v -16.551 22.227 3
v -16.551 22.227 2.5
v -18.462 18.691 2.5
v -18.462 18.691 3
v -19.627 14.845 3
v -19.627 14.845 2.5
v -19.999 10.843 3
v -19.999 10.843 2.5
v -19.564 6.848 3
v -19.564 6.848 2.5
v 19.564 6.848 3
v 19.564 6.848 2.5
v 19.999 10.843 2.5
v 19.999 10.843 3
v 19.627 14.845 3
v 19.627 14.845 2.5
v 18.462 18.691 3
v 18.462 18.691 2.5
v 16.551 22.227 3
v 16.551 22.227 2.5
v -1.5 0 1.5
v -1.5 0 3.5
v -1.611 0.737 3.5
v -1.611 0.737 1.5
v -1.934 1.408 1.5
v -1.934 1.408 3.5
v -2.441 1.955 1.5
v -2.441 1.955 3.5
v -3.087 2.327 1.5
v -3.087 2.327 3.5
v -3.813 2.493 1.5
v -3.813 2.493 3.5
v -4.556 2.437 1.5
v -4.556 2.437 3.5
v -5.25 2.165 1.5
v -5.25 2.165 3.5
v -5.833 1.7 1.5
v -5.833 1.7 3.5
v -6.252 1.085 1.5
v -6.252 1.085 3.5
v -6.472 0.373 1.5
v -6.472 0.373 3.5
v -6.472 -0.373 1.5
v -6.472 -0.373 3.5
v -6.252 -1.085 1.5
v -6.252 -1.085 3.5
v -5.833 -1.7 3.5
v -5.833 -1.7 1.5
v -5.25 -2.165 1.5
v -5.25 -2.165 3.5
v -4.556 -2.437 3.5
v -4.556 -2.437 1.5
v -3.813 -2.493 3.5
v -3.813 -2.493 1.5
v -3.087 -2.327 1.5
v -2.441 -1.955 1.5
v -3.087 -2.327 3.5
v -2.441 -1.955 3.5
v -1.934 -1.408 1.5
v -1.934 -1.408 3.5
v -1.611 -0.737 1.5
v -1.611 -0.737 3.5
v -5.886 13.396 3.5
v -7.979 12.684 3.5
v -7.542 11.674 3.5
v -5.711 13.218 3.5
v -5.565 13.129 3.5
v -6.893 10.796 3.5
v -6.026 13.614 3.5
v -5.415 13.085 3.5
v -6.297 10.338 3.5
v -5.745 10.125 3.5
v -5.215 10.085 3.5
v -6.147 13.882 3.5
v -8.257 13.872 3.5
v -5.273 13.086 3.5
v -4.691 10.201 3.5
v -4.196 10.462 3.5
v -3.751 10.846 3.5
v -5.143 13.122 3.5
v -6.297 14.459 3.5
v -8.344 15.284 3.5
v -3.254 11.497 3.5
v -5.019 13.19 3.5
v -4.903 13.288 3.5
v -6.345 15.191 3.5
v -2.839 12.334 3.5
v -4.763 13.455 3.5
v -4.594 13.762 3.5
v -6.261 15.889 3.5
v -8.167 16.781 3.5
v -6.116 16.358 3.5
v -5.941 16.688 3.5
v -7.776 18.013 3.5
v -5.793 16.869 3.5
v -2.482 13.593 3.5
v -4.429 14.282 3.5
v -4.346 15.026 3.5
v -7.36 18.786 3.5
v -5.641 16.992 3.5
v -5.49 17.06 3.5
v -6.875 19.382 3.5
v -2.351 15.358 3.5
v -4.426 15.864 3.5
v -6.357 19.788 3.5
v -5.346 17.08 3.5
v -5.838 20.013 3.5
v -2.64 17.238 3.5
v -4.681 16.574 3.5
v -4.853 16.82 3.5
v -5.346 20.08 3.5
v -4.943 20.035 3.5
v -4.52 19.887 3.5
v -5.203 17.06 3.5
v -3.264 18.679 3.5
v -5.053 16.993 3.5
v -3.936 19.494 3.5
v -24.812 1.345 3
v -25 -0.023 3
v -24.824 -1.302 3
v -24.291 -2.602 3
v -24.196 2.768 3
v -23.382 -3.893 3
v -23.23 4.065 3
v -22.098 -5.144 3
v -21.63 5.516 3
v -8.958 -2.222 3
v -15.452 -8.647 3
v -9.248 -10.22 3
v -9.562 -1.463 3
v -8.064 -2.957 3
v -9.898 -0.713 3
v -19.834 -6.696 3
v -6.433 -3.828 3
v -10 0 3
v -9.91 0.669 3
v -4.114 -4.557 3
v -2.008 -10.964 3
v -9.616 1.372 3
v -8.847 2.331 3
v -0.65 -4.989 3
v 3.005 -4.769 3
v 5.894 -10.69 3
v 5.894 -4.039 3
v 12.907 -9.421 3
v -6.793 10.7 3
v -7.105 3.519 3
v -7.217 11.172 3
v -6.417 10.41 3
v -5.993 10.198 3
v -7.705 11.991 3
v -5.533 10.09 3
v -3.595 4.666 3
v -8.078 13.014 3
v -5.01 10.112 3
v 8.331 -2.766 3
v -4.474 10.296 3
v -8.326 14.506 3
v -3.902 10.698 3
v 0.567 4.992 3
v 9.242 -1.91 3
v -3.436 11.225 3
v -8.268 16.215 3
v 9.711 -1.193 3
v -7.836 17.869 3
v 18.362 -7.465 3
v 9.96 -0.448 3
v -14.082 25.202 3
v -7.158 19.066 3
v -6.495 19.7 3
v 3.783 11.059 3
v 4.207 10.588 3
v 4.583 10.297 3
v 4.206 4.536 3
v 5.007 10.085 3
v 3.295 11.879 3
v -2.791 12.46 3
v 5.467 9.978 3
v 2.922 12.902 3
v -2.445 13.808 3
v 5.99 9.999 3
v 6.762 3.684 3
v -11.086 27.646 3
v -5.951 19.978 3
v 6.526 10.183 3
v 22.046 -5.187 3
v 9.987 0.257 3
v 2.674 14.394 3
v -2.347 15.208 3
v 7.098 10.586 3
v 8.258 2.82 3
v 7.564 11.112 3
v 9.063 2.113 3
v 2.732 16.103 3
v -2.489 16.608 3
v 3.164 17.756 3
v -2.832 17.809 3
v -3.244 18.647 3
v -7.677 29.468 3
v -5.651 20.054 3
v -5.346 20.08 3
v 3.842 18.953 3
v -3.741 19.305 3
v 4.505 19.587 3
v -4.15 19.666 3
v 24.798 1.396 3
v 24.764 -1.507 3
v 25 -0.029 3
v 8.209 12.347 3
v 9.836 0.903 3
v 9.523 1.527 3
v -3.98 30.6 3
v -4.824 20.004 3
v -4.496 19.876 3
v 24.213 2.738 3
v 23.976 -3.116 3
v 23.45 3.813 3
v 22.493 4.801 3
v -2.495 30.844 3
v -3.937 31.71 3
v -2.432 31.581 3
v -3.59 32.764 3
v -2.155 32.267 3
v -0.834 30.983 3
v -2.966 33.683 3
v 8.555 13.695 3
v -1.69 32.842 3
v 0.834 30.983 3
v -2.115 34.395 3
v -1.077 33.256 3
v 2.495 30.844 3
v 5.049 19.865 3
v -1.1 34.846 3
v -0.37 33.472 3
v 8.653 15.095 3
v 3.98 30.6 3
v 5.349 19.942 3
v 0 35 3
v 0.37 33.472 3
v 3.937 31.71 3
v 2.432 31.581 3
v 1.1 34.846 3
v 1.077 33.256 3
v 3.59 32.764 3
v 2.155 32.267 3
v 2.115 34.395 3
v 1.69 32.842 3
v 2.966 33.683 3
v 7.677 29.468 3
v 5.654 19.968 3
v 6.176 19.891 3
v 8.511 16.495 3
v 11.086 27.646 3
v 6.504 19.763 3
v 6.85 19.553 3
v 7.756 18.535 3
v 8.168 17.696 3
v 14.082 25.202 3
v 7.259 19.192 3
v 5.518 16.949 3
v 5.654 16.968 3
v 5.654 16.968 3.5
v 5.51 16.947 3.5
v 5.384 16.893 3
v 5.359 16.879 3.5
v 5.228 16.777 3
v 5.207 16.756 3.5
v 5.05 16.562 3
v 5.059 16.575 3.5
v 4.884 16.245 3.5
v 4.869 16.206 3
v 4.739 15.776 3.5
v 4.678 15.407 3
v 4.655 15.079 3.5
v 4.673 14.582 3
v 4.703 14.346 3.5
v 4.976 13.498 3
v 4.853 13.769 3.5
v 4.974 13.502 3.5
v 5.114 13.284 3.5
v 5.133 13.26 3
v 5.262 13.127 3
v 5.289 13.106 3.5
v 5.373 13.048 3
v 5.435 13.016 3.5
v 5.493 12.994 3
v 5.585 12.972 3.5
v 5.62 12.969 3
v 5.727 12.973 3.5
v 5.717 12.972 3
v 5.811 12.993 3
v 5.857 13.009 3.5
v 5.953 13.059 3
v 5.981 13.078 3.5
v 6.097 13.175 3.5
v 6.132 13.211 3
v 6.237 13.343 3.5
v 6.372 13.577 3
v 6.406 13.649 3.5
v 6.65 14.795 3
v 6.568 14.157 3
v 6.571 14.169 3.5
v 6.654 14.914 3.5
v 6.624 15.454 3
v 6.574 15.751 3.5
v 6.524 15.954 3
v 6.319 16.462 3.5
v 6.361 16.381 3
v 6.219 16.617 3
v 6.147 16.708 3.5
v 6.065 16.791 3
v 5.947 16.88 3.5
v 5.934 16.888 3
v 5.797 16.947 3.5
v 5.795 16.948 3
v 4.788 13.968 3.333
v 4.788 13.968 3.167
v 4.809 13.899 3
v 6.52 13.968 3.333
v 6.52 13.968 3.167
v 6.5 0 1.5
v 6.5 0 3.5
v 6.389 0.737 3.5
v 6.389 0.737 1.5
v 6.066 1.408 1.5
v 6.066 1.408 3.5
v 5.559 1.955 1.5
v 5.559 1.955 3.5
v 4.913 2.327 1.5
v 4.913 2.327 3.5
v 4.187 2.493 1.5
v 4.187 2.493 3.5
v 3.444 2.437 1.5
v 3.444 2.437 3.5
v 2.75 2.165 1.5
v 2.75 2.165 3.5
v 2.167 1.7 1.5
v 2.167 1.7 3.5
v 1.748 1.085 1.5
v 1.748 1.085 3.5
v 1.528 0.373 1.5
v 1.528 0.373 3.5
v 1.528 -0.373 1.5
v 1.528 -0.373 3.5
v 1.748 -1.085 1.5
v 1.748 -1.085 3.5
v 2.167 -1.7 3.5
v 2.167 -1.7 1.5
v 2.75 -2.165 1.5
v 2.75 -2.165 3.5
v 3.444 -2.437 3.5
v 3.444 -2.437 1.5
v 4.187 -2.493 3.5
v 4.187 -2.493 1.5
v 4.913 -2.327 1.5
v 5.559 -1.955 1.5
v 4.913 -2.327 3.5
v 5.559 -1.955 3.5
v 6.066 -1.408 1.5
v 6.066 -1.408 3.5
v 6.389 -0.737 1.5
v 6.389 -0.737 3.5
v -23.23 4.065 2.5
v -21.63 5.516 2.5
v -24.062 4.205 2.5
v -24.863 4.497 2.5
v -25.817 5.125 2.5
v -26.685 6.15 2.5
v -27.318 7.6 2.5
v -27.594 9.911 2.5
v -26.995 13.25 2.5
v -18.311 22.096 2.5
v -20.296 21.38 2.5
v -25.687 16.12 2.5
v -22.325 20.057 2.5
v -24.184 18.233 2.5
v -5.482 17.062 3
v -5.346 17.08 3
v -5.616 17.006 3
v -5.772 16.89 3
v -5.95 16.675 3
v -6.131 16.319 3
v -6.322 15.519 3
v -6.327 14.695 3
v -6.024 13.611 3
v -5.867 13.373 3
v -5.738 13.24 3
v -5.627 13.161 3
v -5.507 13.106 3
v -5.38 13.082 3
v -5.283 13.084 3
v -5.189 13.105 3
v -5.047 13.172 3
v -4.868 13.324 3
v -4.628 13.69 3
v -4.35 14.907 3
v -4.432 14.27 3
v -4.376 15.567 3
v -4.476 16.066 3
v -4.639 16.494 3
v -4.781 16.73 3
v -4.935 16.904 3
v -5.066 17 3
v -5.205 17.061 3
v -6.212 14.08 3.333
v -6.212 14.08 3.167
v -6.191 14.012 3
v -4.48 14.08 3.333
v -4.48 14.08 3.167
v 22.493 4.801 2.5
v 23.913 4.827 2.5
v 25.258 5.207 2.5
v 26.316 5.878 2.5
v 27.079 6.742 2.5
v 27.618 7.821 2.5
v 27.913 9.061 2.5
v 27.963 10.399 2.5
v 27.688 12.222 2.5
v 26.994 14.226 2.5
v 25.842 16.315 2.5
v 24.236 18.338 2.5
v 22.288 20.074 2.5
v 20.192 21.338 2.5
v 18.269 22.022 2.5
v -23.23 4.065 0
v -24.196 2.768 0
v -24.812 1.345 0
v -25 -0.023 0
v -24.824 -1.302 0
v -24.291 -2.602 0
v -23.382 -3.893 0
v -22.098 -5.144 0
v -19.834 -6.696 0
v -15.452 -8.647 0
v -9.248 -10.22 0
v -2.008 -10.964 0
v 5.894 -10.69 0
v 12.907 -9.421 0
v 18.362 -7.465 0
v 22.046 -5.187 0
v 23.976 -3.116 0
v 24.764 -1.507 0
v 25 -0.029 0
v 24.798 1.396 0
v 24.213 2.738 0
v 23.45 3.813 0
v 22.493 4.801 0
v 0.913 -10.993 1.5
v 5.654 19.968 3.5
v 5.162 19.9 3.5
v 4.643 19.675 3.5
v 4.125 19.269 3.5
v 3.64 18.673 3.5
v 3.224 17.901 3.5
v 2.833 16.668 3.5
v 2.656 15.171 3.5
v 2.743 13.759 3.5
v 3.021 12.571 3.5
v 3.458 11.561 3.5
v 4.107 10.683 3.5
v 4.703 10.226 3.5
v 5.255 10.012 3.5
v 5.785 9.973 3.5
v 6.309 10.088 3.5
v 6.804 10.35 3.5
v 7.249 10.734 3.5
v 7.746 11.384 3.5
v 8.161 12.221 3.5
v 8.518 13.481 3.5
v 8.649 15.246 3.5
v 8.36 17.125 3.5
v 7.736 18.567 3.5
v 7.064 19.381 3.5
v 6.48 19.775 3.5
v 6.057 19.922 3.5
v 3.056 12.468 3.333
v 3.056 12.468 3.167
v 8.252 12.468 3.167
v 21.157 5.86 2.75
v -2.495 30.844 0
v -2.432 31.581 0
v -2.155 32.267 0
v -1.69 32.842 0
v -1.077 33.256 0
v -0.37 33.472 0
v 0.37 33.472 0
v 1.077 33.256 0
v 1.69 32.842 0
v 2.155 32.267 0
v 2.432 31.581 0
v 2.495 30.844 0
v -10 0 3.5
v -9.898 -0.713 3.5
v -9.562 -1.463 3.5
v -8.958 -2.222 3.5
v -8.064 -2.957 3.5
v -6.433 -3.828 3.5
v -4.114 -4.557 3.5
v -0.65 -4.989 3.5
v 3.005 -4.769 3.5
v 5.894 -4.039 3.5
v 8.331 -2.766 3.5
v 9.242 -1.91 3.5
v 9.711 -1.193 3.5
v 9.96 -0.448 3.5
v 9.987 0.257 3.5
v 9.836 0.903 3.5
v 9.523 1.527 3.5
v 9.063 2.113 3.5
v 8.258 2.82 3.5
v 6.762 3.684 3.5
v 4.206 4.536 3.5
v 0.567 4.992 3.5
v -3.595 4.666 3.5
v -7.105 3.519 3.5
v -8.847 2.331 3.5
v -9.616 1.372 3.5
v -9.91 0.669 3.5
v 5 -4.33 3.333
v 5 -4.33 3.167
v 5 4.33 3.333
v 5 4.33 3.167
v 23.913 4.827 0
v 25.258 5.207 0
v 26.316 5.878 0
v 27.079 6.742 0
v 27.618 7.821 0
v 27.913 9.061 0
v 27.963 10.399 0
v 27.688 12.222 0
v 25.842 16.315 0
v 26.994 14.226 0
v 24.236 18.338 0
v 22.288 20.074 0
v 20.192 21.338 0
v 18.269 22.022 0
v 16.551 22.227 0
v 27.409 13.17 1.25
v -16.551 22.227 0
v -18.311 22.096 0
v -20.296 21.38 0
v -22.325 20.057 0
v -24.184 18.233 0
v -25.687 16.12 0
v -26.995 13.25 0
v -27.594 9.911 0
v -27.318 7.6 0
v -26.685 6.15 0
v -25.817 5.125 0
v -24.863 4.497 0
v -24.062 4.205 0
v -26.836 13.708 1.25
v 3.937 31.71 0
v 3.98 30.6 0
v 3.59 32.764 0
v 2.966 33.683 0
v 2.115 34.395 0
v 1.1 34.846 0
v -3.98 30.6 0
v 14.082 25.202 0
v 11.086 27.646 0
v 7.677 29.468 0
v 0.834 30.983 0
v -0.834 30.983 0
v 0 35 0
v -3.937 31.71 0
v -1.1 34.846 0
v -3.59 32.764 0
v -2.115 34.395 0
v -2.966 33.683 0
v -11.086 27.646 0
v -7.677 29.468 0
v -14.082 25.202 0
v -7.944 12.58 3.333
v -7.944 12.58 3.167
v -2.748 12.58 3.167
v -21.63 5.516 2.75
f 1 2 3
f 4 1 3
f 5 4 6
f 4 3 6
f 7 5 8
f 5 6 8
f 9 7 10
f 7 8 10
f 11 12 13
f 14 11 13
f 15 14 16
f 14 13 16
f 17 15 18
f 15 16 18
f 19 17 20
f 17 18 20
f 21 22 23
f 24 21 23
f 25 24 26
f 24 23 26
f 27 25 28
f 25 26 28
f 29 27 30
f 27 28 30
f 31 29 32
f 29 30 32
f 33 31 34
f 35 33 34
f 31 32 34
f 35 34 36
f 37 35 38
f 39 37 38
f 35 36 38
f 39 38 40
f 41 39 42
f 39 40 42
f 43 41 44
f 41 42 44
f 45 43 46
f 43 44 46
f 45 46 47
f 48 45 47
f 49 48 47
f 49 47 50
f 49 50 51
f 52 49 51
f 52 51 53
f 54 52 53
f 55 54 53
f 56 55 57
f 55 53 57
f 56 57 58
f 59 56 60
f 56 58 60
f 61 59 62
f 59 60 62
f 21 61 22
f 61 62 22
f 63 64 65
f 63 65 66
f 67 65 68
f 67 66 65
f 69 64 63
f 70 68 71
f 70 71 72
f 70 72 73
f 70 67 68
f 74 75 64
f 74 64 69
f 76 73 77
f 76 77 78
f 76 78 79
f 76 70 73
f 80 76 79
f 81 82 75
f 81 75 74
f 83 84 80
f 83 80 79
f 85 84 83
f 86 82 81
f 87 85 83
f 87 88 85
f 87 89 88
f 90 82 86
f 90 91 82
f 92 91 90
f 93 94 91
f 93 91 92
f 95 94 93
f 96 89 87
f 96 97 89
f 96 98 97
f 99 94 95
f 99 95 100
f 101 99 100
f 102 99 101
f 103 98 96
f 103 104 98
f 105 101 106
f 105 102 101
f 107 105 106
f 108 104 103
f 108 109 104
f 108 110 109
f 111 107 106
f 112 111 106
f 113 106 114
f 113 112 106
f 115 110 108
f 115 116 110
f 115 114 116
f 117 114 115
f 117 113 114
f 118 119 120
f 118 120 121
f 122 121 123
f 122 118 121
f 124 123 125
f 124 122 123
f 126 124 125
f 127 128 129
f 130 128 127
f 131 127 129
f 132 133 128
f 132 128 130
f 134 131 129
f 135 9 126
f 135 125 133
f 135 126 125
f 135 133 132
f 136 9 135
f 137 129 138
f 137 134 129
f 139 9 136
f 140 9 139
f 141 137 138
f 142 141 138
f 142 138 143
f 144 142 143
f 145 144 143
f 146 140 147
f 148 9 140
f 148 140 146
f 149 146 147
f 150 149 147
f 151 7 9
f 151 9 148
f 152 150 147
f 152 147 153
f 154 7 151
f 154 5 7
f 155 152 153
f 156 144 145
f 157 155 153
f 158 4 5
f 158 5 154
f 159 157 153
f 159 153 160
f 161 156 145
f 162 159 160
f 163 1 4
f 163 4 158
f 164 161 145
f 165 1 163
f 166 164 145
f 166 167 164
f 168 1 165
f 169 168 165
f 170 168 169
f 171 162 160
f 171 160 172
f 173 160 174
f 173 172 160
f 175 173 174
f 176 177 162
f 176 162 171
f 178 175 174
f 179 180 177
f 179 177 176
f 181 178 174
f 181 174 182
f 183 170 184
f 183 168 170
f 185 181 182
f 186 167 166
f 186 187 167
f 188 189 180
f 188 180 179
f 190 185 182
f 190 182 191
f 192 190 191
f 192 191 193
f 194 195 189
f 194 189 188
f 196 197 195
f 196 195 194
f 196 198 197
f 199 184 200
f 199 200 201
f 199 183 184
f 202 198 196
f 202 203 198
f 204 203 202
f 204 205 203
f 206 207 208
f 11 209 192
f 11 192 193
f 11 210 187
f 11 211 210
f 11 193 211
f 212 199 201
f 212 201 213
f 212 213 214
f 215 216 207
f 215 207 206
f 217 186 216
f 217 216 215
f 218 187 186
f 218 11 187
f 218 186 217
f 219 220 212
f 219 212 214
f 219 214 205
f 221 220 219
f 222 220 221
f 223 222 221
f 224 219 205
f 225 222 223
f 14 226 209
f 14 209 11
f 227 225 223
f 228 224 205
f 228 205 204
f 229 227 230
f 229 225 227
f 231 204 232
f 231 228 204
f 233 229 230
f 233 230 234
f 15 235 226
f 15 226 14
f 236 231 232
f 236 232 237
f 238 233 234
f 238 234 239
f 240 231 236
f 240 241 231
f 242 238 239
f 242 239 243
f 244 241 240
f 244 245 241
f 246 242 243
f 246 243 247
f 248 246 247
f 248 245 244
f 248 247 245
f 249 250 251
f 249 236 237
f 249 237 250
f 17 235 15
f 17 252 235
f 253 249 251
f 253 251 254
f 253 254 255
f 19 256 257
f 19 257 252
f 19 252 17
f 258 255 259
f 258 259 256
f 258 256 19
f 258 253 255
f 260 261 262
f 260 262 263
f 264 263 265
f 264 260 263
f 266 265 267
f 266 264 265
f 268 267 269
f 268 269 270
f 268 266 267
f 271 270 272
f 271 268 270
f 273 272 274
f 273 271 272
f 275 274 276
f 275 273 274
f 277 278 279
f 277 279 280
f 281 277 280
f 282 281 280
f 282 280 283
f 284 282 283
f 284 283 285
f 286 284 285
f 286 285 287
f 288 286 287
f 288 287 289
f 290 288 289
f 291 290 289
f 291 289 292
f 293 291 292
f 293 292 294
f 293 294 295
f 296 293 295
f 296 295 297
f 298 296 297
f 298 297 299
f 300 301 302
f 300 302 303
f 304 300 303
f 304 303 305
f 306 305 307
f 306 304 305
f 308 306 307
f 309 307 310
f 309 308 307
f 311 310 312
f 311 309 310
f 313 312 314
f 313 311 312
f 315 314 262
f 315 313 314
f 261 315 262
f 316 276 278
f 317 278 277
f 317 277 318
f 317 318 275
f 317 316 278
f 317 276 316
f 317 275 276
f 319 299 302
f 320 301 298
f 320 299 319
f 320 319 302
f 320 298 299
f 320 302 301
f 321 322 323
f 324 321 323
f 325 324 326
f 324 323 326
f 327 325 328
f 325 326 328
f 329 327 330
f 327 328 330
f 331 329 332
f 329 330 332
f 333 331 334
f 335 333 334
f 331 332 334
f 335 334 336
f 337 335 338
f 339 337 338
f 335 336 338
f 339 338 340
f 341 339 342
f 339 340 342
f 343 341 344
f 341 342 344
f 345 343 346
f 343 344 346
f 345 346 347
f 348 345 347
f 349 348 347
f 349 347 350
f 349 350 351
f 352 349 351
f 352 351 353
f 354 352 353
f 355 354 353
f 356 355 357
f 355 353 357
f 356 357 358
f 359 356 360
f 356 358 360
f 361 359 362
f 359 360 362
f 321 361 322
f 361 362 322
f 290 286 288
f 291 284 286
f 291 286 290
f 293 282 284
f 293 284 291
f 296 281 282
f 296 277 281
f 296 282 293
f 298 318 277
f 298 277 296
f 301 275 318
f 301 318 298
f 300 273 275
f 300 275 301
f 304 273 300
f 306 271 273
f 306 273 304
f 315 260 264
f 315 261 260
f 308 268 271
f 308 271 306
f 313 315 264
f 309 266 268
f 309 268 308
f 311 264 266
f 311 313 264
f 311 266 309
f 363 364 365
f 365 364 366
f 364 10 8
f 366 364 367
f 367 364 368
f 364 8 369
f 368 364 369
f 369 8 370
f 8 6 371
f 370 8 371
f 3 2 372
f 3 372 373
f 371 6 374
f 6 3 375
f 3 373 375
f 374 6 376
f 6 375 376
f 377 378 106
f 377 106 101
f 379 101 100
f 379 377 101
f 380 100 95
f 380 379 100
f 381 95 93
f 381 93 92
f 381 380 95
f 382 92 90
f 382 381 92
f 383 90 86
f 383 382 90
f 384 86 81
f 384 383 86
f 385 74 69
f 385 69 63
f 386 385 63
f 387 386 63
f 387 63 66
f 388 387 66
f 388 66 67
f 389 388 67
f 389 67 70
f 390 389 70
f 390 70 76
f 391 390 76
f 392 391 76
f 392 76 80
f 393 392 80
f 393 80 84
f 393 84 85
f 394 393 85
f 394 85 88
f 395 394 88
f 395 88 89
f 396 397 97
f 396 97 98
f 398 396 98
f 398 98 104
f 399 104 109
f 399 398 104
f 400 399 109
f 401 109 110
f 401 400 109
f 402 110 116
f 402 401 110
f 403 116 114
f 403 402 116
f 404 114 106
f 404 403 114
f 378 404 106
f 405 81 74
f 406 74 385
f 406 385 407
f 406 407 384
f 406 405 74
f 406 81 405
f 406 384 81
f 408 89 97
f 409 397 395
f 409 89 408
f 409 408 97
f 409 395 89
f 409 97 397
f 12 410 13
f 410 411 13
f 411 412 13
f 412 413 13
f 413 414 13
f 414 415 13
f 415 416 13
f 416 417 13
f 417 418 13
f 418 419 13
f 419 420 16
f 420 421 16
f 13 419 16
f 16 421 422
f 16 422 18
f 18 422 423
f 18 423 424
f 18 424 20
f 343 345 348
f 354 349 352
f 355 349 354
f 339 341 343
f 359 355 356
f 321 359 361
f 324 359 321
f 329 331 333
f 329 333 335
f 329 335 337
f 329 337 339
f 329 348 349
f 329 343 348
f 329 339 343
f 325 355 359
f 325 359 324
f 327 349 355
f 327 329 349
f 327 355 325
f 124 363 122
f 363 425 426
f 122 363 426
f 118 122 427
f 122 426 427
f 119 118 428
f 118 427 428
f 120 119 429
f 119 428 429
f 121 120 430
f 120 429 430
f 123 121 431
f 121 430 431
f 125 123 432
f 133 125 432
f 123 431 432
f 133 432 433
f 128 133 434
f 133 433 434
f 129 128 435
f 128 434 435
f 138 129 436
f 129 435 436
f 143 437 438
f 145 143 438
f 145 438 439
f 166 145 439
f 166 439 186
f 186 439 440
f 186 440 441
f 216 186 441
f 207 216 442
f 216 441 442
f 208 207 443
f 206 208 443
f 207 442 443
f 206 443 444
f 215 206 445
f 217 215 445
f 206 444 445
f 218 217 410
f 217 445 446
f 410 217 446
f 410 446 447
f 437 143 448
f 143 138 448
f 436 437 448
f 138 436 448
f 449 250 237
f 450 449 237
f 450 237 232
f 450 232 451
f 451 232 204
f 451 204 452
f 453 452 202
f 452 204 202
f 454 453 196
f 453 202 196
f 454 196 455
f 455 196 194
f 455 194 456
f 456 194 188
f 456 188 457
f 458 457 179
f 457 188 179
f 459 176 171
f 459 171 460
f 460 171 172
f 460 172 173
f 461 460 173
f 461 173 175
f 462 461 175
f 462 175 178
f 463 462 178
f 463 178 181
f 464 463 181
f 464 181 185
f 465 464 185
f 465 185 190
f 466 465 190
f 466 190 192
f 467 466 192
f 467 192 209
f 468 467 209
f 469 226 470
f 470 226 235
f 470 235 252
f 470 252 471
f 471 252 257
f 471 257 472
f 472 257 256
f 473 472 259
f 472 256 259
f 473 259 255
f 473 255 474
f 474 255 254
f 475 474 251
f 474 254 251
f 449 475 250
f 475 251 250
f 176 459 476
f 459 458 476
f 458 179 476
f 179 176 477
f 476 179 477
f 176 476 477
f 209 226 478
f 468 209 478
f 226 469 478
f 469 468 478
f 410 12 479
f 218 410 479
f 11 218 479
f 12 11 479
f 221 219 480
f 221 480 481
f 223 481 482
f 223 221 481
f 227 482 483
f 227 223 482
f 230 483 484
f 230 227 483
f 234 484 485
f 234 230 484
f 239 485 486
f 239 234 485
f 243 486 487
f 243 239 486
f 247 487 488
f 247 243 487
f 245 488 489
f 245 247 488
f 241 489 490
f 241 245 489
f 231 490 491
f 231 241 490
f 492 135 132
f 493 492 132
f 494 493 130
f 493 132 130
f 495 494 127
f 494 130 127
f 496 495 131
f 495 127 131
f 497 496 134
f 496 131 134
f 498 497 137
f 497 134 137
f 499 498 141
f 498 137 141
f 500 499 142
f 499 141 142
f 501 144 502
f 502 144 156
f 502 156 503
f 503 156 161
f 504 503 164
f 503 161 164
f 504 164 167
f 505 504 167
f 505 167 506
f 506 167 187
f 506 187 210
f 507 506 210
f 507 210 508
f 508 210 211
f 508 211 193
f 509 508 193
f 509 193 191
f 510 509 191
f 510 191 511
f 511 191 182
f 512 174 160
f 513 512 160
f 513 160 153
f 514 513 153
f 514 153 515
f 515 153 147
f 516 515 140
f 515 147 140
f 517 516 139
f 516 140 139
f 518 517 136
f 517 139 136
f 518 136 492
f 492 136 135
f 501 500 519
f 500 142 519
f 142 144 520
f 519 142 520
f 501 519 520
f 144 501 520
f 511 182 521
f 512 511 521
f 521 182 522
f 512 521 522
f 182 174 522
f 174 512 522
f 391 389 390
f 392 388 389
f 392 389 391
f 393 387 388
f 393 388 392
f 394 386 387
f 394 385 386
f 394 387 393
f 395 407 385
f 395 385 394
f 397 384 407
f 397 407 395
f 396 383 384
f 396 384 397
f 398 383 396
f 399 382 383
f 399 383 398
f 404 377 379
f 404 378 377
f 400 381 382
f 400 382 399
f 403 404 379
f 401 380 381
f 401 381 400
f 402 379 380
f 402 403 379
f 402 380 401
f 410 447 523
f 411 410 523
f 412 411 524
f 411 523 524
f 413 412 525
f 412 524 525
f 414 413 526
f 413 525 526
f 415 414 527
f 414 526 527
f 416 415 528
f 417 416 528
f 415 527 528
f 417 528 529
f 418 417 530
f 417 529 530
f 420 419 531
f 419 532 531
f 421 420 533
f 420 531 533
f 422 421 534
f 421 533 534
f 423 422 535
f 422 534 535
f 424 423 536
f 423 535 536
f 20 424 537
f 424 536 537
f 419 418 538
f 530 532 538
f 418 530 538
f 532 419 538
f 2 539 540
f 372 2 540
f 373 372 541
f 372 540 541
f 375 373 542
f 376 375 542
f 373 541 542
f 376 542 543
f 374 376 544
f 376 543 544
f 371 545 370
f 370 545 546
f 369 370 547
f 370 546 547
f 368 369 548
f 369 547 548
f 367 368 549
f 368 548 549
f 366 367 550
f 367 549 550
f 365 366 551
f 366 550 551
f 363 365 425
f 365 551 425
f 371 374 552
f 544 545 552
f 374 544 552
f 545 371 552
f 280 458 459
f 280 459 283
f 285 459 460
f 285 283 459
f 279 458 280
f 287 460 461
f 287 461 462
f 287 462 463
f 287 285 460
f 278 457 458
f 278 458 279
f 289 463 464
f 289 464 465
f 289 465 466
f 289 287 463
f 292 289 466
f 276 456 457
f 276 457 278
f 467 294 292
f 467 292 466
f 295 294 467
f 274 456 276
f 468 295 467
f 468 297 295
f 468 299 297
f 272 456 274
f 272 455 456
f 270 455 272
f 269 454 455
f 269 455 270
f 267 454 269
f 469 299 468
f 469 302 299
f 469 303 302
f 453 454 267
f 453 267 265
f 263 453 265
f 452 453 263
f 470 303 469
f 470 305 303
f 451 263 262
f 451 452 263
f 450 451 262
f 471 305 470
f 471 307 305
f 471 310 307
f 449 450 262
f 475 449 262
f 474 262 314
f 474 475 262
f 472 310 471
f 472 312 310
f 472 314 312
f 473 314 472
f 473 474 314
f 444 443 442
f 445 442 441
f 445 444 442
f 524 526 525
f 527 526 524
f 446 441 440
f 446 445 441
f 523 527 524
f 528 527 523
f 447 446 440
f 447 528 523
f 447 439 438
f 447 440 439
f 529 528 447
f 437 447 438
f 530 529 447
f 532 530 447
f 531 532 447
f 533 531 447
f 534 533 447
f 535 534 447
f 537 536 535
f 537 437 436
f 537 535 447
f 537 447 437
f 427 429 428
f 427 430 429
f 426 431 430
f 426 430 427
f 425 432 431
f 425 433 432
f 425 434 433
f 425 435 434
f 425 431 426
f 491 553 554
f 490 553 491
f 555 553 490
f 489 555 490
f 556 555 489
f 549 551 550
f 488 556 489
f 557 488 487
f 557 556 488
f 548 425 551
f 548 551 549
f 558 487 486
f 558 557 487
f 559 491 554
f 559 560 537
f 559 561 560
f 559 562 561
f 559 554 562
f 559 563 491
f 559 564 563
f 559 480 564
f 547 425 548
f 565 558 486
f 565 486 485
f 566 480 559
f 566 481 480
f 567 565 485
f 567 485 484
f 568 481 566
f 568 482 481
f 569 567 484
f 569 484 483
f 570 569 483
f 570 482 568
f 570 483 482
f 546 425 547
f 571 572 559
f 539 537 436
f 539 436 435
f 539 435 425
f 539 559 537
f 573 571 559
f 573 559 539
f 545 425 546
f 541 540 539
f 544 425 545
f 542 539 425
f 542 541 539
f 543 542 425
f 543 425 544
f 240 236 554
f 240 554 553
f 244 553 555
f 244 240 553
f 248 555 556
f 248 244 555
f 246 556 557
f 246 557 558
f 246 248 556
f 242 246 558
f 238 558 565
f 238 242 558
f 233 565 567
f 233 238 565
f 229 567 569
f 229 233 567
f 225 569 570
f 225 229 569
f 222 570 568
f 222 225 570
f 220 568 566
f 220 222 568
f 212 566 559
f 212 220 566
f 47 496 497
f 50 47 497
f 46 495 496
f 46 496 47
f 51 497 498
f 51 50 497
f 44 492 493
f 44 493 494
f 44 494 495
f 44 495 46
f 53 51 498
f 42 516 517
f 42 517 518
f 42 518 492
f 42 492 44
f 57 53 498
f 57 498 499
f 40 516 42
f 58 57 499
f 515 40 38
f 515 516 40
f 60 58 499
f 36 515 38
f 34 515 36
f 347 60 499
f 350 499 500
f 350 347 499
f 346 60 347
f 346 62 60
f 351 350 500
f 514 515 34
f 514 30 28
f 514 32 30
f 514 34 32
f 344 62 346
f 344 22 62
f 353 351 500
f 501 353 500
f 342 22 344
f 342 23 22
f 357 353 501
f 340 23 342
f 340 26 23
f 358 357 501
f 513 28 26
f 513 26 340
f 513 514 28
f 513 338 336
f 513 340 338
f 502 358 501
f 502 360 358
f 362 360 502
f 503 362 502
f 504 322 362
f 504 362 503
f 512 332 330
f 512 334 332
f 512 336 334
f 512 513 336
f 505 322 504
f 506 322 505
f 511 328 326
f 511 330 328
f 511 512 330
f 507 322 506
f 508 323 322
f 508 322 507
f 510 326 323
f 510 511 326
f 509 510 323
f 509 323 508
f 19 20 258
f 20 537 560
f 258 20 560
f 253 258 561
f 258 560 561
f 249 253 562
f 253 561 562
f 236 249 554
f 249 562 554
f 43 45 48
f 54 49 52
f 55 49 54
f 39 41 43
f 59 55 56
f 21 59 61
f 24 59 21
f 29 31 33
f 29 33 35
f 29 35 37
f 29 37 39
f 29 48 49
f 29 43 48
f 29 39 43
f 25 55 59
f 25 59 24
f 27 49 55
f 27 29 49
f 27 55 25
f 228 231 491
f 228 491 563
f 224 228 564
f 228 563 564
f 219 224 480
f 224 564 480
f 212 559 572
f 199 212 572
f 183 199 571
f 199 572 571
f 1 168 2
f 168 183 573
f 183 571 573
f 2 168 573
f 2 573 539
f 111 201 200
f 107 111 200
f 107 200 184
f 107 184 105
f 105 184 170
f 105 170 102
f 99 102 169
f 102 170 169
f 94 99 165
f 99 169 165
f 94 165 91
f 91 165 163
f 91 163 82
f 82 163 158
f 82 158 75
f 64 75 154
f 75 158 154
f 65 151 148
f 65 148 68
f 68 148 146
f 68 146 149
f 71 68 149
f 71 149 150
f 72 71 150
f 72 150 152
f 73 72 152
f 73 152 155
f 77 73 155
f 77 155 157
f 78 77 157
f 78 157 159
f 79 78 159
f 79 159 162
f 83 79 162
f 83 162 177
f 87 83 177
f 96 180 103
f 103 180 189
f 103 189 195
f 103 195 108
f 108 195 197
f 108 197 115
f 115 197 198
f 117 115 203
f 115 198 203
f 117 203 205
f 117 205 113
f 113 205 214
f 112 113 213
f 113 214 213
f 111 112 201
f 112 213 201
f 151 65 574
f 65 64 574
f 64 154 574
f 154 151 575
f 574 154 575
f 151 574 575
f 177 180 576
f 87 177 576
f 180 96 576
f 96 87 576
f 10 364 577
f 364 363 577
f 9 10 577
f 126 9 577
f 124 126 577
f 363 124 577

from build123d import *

# Parameters (mm, degrees)
F2_DEPTH  = 3
F3_DEPTH  = 3.5
F4_DEPTH  = 2.5
F6_DEPTH  = 3.5
F7_DEPTH  = 1
F8_R      = 2.5
F9_DEPTH  = 2
F11_DEPTH = 3


with BuildPart() as f2:
    # F0 (on Top) → F2 (new body)
    with BuildSketch(Plane.XY):
        with BuildLine():
            ThreePointArc((-16.5514327476, 22.2272024121), (-19.6269067874, 14.845065664), (-19.5643091096, 6.8481559441))
            add(Edge.make_bspline(
                [(-19.5643091096, 6.8481559441), (-21.8645069568, 5.5759382833), (-23.23, 4.0653499923)],
                knots=[5.6111760506, 5.6111760506, 5.6111760506, 5.9046312652, 5.9046312652, 5.9046312652], degree=2, weights=[1, 0.9892548032, 1]))
            add(Edge.make_bspline(
                [(-23.23, 4.0653499923), (-37.3986969508, -11.6088914976), (0.9132892277, -10.992657494), (39.2252754062, -10.3764234903), (22.4933852711, 4.8007935852)],
                knots=[5.9046312652, 5.9046312652, 5.9046312652, 7.8905213335, 7.8905213335, 9.8764114018, 9.8764114018, 9.8764114018], degree=2, weights=[1, 0.5462253596, 1, 0.5462253596, 1]))
            add(Edge.make_bspline(
                [(22.4933852711, 4.8007935852), (21.2862472359, 5.8957682624), (19.5643091096, 6.8481559441)],
                knots=[3.5932260947, 3.5932260947, 3.5932260947, 3.8136019101, 3.8136019101, 3.8136019101], degree=2, weights=[1, 0.9939354522, 1]))
            ThreePointArc((19.5643091096, 6.8481559441), (19.6269067874, 14.845065664), (16.5514327476, 22.2272024121))
            ThreePointArc((16.5514327476, 22.2272024121), (0, 31), (-16.5514327476, 22.2272024121))
        make_face()
        with BuildLine():
            add(Edge.make_bspline(
                [(-10, 0), (-10, -8.6602540378), (5, -4.3301270189), (20, 0), (5, 4.3301270189), (-10, 8.6602540378), (-10, 0)],
                knots=[0, 0, 0, 2.0943951024, 2.0943951024, 4.1887902048, 4.1887902048, 6.2831853072, 6.2831853072, 6.2831853072], degree=2, weights=[1, 0.5, 1, 0.5, 1, 0.5, 1]))
        make_face(mode=Mode.SUBTRACT)
    extrude(amount=F2_DEPTH)

    # F1 (on Top) → F3 (join)
    with BuildSketch(Plane.XY):
        with BuildLine():
            add(Edge.make_bspline(
                [(5.653910271, 19.9677419355), (0.4577578483, 19.9677419355), (3.0558340597, 12.4677419355), (5.653910271, 4.9677419355), (8.2519864824, 12.4677419355), (10.8500626937, 19.9677419355), (5.653910271, 19.9677419355)],
                knots=[0, 0, 0, 2.0943951024, 2.0943951024, 4.1887902048, 4.1887902048, 6.2831853072, 6.2831853072, 6.2831853072], degree=2, weights=[1, 0.5, 1, 0.5, 1, 0.5, 1]))
        make_face()
        with BuildLine():
            add(Edge.make_bspline(
                [(5.653910271, 16.9677419355), (3.9218594635, 16.9677419355), (4.7878848672, 13.9677419355), (5.653910271, 10.9677419355), (6.5199356748, 13.9677419355), (7.3859610786, 16.9677419355), (5.653910271, 16.9677419355)],
                knots=[0, 0, 0, 2.0943951024, 2.0943951024, 4.1887902048, 4.1887902048, 6.2831853072, 6.2831853072, 6.2831853072], degree=2, weights=[1, 0.5, 1, 0.5, 1, 0.5, 1]))
        make_face(mode=Mode.SUBTRACT)
        with BuildLine():
            add(Edge.make_bspline(
                [(-5.346089729, 20.0804285287), (-10.5422421517, 20.0804285287), (-7.9441659403, 12.5804285287), (-5.346089729, 5.0804285287), (-2.7480135176, 12.5804285287), (-0.1499373063, 20.0804285287), (-5.346089729, 20.0804285287)],
                knots=[0, 0, 0, 2.0943951024, 2.0943951024, 4.1887902048, 4.1887902048, 6.2831853072, 6.2831853072, 6.2831853072], degree=2, weights=[1, 0.5, 1, 0.5, 1, 0.5, 1]))
        make_face()
        with BuildLine():
            add(Edge.make_bspline(
                [(-5.346089729, 17.0804285287), (-7.0781405365, 17.0804285287), (-6.2121151328, 14.0804285287), (-5.346089729, 11.0804285287), (-4.4800643252, 14.0804285287), (-3.6140389214, 17.0804285287), (-5.346089729, 17.0804285287)],
                knots=[0, 0, 0, 2.0943951024, 2.0943951024, 4.1887902048, 4.1887902048, 6.2831853072, 6.2831853072, 6.2831853072], degree=2, weights=[1, 0.5, 1, 0.5, 1, 0.5, 1]))
        make_face(mode=Mode.SUBTRACT)
    extrude(amount=F3_DEPTH)

    # F0 (on Top) → F4 (join)
    with BuildSketch(Plane.XY):
        with BuildLine():
            add(Edge.make_bspline(
                [(22.4933852711, 4.8007935852), (21.2862472359, 5.8957682624), (19.5643091096, 6.8481559441)],
                knots=[3.5932260947, 3.5932260947, 3.5932260947, 3.8136019101, 3.8136019101, 3.8136019101], degree=2, weights=[1, 0.9939354522, 1]))
            add(Edge.make_bspline(
                [(22.4933852711, 4.8007935852), (30.5114588738, 4.0708712152), (27.4089635962, 13.1697912888), (24.3064683185, 22.2687113623), (16.5514327476, 22.2272024121)],
                knots=[2.5624257149, 2.5624257149, 2.5624257149, 4.1756261153, 4.1756261153, 5.7888265158, 5.7888265158, 5.7888265158], degree=2, weights=[1, 0.6919568747, 1, 0.6919568747, 1]))
            ThreePointArc((16.5514327476, 22.2272024121), (19.6269067874, 14.845065664), (19.5643091096, 6.8481559441))
        make_face()
        with BuildLine():
            add(Edge.make_bspline(
                [(-19.5643091096, 6.8481559441), (-21.8645069568, 5.5759382833), (-23.23, 4.0653499923)],
                knots=[5.6111760506, 5.6111760506, 5.6111760506, 5.9046312652, 5.9046312652, 5.9046312652], degree=2, weights=[1, 0.9892548032, 1]))
            ThreePointArc((-19.5643091096, 6.8481559441), (-19.6269067874, 14.845065664), (-16.5514327476, 22.2272024121))
            add(Edge.make_bspline(
                [(-16.5514327476, 22.2272024121), (-23.4995108928, 22.7804351501), (-26.8358386071, 13.7075473165), (-30.1721663213, 4.6346594829), (-23.23, 4.0653499923)],
                knots=[0.3398741253, 0.3398741253, 0.3398741253, 1.9097844743, 1.9097844743, 3.4796948232, 3.4796948232, 3.4796948232], degree=2, weights=[1, 0.7074199523, 1, 0.7074199523, 1]))
        make_face()
    extrude(amount=F4_DEPTH)

    # F5 (on Top) → F6 (join)
    with BuildSketch(Plane.XY):
        with BuildLine():
            add(Edge.make_bspline(
                [(-10, 0), (-10, -8.6602540378), (5, -4.3301270189), (20, 0), (5, 4.3301270189), (-10, 8.6602540378), (-10, 0)],
                knots=[0, 0, 0, 2.0943951024, 2.0943951024, 4.1887902048, 4.1887902048, 6.2831853072, 6.2831853072, 6.2831853072], degree=2, weights=[1, 0.5, 1, 0.5, 1, 0.5, 1]))
        make_face()
    extrude(amount=F6_DEPTH)

    # F1 (on Top) → F7 (join)
    with BuildSketch(Plane.XY):
        with BuildLine():
            add(Edge.make_bspline(
                [(5.653910271, 19.9677419355), (0.4577578483, 19.9677419355), (3.0558340597, 12.4677419355), (5.653910271, 4.9677419355), (8.2519864824, 12.4677419355), (10.8500626937, 19.9677419355), (5.653910271, 19.9677419355)],
                knots=[0, 0, 0, 2.0943951024, 2.0943951024, 4.1887902048, 4.1887902048, 6.2831853072, 6.2831853072, 6.2831853072], degree=2, weights=[1, 0.5, 1, 0.5, 1, 0.5, 1]))
        make_face()
        with BuildLine():
            add(Edge.make_bspline(
                [(5.653910271, 16.9677419355), (3.9218594635, 16.9677419355), (4.7878848672, 13.9677419355), (5.653910271, 10.9677419355), (6.5199356748, 13.9677419355), (7.3859610786, 16.9677419355), (5.653910271, 16.9677419355)],
                knots=[0, 0, 0, 2.0943951024, 2.0943951024, 4.1887902048, 4.1887902048, 6.2831853072, 6.2831853072, 6.2831853072], degree=2, weights=[1, 0.5, 1, 0.5, 1, 0.5, 1]))
        make_face(mode=Mode.SUBTRACT)
        with BuildLine():
            add(Edge.make_bspline(
                [(-5.346089729, 20.0804285287), (-10.5422421517, 20.0804285287), (-7.9441659403, 12.5804285287), (-5.346089729, 5.0804285287), (-2.7480135176, 12.5804285287), (-0.1499373063, 20.0804285287), (-5.346089729, 20.0804285287)],
                knots=[0, 0, 0, 2.0943951024, 2.0943951024, 4.1887902048, 4.1887902048, 6.2831853072, 6.2831853072, 6.2831853072], degree=2, weights=[1, 0.5, 1, 0.5, 1, 0.5, 1]))
        make_face()
        with BuildLine():
            add(Edge.make_bspline(
                [(-5.346089729, 17.0804285287), (-7.0781405365, 17.0804285287), (-6.2121151328, 14.0804285287), (-5.346089729, 11.0804285287), (-4.4800643252, 14.0804285287), (-3.6140389214, 17.0804285287), (-5.346089729, 17.0804285287)],
                knots=[0, 0, 0, 2.0943951024, 2.0943951024, 4.1887902048, 4.1887902048, 6.2831853072, 6.2831853072, 6.2831853072], degree=2, weights=[1, 0.5, 1, 0.5, 1, 0.5, 1]))
        make_face(mode=Mode.SUBTRACT)
    extrude(amount=F7_DEPTH)

    # F8 (on face) → F9 (cut)
    with BuildSketch(Plane.XY.offset(3.5)):
        with Locations((-4, 0)):
            Circle(F8_R)
        with Locations((4, 0)):
            Circle(F8_R)
    extrude(amount=-F9_DEPTH, mode=Mode.SUBTRACT)

    # F10 (on face) → F11 (join)
    with BuildSketch(Plane.XY.offset(3)):
        with BuildLine():
            ThreePointArc((-2.4951124098, 30.84375), (0, 33.5), (2.4951124098, 30.84375))
            ThreePointArc((2.4951124098, 30.84375), (3.2398242242, 30.7358440153), (3.9799497484, 30.6))
            ThreePointArc((3.9799497484, 30.6), (0, 35), (-3.9799497484, 30.6))
            ThreePointArc((-3.9799497484, 30.6), (-3.2398242242, 30.7358440153), (-2.4951124098, 30.84375))
        make_face()
    extrude(amount=-F11_DEPTH)


solid = f2.part
